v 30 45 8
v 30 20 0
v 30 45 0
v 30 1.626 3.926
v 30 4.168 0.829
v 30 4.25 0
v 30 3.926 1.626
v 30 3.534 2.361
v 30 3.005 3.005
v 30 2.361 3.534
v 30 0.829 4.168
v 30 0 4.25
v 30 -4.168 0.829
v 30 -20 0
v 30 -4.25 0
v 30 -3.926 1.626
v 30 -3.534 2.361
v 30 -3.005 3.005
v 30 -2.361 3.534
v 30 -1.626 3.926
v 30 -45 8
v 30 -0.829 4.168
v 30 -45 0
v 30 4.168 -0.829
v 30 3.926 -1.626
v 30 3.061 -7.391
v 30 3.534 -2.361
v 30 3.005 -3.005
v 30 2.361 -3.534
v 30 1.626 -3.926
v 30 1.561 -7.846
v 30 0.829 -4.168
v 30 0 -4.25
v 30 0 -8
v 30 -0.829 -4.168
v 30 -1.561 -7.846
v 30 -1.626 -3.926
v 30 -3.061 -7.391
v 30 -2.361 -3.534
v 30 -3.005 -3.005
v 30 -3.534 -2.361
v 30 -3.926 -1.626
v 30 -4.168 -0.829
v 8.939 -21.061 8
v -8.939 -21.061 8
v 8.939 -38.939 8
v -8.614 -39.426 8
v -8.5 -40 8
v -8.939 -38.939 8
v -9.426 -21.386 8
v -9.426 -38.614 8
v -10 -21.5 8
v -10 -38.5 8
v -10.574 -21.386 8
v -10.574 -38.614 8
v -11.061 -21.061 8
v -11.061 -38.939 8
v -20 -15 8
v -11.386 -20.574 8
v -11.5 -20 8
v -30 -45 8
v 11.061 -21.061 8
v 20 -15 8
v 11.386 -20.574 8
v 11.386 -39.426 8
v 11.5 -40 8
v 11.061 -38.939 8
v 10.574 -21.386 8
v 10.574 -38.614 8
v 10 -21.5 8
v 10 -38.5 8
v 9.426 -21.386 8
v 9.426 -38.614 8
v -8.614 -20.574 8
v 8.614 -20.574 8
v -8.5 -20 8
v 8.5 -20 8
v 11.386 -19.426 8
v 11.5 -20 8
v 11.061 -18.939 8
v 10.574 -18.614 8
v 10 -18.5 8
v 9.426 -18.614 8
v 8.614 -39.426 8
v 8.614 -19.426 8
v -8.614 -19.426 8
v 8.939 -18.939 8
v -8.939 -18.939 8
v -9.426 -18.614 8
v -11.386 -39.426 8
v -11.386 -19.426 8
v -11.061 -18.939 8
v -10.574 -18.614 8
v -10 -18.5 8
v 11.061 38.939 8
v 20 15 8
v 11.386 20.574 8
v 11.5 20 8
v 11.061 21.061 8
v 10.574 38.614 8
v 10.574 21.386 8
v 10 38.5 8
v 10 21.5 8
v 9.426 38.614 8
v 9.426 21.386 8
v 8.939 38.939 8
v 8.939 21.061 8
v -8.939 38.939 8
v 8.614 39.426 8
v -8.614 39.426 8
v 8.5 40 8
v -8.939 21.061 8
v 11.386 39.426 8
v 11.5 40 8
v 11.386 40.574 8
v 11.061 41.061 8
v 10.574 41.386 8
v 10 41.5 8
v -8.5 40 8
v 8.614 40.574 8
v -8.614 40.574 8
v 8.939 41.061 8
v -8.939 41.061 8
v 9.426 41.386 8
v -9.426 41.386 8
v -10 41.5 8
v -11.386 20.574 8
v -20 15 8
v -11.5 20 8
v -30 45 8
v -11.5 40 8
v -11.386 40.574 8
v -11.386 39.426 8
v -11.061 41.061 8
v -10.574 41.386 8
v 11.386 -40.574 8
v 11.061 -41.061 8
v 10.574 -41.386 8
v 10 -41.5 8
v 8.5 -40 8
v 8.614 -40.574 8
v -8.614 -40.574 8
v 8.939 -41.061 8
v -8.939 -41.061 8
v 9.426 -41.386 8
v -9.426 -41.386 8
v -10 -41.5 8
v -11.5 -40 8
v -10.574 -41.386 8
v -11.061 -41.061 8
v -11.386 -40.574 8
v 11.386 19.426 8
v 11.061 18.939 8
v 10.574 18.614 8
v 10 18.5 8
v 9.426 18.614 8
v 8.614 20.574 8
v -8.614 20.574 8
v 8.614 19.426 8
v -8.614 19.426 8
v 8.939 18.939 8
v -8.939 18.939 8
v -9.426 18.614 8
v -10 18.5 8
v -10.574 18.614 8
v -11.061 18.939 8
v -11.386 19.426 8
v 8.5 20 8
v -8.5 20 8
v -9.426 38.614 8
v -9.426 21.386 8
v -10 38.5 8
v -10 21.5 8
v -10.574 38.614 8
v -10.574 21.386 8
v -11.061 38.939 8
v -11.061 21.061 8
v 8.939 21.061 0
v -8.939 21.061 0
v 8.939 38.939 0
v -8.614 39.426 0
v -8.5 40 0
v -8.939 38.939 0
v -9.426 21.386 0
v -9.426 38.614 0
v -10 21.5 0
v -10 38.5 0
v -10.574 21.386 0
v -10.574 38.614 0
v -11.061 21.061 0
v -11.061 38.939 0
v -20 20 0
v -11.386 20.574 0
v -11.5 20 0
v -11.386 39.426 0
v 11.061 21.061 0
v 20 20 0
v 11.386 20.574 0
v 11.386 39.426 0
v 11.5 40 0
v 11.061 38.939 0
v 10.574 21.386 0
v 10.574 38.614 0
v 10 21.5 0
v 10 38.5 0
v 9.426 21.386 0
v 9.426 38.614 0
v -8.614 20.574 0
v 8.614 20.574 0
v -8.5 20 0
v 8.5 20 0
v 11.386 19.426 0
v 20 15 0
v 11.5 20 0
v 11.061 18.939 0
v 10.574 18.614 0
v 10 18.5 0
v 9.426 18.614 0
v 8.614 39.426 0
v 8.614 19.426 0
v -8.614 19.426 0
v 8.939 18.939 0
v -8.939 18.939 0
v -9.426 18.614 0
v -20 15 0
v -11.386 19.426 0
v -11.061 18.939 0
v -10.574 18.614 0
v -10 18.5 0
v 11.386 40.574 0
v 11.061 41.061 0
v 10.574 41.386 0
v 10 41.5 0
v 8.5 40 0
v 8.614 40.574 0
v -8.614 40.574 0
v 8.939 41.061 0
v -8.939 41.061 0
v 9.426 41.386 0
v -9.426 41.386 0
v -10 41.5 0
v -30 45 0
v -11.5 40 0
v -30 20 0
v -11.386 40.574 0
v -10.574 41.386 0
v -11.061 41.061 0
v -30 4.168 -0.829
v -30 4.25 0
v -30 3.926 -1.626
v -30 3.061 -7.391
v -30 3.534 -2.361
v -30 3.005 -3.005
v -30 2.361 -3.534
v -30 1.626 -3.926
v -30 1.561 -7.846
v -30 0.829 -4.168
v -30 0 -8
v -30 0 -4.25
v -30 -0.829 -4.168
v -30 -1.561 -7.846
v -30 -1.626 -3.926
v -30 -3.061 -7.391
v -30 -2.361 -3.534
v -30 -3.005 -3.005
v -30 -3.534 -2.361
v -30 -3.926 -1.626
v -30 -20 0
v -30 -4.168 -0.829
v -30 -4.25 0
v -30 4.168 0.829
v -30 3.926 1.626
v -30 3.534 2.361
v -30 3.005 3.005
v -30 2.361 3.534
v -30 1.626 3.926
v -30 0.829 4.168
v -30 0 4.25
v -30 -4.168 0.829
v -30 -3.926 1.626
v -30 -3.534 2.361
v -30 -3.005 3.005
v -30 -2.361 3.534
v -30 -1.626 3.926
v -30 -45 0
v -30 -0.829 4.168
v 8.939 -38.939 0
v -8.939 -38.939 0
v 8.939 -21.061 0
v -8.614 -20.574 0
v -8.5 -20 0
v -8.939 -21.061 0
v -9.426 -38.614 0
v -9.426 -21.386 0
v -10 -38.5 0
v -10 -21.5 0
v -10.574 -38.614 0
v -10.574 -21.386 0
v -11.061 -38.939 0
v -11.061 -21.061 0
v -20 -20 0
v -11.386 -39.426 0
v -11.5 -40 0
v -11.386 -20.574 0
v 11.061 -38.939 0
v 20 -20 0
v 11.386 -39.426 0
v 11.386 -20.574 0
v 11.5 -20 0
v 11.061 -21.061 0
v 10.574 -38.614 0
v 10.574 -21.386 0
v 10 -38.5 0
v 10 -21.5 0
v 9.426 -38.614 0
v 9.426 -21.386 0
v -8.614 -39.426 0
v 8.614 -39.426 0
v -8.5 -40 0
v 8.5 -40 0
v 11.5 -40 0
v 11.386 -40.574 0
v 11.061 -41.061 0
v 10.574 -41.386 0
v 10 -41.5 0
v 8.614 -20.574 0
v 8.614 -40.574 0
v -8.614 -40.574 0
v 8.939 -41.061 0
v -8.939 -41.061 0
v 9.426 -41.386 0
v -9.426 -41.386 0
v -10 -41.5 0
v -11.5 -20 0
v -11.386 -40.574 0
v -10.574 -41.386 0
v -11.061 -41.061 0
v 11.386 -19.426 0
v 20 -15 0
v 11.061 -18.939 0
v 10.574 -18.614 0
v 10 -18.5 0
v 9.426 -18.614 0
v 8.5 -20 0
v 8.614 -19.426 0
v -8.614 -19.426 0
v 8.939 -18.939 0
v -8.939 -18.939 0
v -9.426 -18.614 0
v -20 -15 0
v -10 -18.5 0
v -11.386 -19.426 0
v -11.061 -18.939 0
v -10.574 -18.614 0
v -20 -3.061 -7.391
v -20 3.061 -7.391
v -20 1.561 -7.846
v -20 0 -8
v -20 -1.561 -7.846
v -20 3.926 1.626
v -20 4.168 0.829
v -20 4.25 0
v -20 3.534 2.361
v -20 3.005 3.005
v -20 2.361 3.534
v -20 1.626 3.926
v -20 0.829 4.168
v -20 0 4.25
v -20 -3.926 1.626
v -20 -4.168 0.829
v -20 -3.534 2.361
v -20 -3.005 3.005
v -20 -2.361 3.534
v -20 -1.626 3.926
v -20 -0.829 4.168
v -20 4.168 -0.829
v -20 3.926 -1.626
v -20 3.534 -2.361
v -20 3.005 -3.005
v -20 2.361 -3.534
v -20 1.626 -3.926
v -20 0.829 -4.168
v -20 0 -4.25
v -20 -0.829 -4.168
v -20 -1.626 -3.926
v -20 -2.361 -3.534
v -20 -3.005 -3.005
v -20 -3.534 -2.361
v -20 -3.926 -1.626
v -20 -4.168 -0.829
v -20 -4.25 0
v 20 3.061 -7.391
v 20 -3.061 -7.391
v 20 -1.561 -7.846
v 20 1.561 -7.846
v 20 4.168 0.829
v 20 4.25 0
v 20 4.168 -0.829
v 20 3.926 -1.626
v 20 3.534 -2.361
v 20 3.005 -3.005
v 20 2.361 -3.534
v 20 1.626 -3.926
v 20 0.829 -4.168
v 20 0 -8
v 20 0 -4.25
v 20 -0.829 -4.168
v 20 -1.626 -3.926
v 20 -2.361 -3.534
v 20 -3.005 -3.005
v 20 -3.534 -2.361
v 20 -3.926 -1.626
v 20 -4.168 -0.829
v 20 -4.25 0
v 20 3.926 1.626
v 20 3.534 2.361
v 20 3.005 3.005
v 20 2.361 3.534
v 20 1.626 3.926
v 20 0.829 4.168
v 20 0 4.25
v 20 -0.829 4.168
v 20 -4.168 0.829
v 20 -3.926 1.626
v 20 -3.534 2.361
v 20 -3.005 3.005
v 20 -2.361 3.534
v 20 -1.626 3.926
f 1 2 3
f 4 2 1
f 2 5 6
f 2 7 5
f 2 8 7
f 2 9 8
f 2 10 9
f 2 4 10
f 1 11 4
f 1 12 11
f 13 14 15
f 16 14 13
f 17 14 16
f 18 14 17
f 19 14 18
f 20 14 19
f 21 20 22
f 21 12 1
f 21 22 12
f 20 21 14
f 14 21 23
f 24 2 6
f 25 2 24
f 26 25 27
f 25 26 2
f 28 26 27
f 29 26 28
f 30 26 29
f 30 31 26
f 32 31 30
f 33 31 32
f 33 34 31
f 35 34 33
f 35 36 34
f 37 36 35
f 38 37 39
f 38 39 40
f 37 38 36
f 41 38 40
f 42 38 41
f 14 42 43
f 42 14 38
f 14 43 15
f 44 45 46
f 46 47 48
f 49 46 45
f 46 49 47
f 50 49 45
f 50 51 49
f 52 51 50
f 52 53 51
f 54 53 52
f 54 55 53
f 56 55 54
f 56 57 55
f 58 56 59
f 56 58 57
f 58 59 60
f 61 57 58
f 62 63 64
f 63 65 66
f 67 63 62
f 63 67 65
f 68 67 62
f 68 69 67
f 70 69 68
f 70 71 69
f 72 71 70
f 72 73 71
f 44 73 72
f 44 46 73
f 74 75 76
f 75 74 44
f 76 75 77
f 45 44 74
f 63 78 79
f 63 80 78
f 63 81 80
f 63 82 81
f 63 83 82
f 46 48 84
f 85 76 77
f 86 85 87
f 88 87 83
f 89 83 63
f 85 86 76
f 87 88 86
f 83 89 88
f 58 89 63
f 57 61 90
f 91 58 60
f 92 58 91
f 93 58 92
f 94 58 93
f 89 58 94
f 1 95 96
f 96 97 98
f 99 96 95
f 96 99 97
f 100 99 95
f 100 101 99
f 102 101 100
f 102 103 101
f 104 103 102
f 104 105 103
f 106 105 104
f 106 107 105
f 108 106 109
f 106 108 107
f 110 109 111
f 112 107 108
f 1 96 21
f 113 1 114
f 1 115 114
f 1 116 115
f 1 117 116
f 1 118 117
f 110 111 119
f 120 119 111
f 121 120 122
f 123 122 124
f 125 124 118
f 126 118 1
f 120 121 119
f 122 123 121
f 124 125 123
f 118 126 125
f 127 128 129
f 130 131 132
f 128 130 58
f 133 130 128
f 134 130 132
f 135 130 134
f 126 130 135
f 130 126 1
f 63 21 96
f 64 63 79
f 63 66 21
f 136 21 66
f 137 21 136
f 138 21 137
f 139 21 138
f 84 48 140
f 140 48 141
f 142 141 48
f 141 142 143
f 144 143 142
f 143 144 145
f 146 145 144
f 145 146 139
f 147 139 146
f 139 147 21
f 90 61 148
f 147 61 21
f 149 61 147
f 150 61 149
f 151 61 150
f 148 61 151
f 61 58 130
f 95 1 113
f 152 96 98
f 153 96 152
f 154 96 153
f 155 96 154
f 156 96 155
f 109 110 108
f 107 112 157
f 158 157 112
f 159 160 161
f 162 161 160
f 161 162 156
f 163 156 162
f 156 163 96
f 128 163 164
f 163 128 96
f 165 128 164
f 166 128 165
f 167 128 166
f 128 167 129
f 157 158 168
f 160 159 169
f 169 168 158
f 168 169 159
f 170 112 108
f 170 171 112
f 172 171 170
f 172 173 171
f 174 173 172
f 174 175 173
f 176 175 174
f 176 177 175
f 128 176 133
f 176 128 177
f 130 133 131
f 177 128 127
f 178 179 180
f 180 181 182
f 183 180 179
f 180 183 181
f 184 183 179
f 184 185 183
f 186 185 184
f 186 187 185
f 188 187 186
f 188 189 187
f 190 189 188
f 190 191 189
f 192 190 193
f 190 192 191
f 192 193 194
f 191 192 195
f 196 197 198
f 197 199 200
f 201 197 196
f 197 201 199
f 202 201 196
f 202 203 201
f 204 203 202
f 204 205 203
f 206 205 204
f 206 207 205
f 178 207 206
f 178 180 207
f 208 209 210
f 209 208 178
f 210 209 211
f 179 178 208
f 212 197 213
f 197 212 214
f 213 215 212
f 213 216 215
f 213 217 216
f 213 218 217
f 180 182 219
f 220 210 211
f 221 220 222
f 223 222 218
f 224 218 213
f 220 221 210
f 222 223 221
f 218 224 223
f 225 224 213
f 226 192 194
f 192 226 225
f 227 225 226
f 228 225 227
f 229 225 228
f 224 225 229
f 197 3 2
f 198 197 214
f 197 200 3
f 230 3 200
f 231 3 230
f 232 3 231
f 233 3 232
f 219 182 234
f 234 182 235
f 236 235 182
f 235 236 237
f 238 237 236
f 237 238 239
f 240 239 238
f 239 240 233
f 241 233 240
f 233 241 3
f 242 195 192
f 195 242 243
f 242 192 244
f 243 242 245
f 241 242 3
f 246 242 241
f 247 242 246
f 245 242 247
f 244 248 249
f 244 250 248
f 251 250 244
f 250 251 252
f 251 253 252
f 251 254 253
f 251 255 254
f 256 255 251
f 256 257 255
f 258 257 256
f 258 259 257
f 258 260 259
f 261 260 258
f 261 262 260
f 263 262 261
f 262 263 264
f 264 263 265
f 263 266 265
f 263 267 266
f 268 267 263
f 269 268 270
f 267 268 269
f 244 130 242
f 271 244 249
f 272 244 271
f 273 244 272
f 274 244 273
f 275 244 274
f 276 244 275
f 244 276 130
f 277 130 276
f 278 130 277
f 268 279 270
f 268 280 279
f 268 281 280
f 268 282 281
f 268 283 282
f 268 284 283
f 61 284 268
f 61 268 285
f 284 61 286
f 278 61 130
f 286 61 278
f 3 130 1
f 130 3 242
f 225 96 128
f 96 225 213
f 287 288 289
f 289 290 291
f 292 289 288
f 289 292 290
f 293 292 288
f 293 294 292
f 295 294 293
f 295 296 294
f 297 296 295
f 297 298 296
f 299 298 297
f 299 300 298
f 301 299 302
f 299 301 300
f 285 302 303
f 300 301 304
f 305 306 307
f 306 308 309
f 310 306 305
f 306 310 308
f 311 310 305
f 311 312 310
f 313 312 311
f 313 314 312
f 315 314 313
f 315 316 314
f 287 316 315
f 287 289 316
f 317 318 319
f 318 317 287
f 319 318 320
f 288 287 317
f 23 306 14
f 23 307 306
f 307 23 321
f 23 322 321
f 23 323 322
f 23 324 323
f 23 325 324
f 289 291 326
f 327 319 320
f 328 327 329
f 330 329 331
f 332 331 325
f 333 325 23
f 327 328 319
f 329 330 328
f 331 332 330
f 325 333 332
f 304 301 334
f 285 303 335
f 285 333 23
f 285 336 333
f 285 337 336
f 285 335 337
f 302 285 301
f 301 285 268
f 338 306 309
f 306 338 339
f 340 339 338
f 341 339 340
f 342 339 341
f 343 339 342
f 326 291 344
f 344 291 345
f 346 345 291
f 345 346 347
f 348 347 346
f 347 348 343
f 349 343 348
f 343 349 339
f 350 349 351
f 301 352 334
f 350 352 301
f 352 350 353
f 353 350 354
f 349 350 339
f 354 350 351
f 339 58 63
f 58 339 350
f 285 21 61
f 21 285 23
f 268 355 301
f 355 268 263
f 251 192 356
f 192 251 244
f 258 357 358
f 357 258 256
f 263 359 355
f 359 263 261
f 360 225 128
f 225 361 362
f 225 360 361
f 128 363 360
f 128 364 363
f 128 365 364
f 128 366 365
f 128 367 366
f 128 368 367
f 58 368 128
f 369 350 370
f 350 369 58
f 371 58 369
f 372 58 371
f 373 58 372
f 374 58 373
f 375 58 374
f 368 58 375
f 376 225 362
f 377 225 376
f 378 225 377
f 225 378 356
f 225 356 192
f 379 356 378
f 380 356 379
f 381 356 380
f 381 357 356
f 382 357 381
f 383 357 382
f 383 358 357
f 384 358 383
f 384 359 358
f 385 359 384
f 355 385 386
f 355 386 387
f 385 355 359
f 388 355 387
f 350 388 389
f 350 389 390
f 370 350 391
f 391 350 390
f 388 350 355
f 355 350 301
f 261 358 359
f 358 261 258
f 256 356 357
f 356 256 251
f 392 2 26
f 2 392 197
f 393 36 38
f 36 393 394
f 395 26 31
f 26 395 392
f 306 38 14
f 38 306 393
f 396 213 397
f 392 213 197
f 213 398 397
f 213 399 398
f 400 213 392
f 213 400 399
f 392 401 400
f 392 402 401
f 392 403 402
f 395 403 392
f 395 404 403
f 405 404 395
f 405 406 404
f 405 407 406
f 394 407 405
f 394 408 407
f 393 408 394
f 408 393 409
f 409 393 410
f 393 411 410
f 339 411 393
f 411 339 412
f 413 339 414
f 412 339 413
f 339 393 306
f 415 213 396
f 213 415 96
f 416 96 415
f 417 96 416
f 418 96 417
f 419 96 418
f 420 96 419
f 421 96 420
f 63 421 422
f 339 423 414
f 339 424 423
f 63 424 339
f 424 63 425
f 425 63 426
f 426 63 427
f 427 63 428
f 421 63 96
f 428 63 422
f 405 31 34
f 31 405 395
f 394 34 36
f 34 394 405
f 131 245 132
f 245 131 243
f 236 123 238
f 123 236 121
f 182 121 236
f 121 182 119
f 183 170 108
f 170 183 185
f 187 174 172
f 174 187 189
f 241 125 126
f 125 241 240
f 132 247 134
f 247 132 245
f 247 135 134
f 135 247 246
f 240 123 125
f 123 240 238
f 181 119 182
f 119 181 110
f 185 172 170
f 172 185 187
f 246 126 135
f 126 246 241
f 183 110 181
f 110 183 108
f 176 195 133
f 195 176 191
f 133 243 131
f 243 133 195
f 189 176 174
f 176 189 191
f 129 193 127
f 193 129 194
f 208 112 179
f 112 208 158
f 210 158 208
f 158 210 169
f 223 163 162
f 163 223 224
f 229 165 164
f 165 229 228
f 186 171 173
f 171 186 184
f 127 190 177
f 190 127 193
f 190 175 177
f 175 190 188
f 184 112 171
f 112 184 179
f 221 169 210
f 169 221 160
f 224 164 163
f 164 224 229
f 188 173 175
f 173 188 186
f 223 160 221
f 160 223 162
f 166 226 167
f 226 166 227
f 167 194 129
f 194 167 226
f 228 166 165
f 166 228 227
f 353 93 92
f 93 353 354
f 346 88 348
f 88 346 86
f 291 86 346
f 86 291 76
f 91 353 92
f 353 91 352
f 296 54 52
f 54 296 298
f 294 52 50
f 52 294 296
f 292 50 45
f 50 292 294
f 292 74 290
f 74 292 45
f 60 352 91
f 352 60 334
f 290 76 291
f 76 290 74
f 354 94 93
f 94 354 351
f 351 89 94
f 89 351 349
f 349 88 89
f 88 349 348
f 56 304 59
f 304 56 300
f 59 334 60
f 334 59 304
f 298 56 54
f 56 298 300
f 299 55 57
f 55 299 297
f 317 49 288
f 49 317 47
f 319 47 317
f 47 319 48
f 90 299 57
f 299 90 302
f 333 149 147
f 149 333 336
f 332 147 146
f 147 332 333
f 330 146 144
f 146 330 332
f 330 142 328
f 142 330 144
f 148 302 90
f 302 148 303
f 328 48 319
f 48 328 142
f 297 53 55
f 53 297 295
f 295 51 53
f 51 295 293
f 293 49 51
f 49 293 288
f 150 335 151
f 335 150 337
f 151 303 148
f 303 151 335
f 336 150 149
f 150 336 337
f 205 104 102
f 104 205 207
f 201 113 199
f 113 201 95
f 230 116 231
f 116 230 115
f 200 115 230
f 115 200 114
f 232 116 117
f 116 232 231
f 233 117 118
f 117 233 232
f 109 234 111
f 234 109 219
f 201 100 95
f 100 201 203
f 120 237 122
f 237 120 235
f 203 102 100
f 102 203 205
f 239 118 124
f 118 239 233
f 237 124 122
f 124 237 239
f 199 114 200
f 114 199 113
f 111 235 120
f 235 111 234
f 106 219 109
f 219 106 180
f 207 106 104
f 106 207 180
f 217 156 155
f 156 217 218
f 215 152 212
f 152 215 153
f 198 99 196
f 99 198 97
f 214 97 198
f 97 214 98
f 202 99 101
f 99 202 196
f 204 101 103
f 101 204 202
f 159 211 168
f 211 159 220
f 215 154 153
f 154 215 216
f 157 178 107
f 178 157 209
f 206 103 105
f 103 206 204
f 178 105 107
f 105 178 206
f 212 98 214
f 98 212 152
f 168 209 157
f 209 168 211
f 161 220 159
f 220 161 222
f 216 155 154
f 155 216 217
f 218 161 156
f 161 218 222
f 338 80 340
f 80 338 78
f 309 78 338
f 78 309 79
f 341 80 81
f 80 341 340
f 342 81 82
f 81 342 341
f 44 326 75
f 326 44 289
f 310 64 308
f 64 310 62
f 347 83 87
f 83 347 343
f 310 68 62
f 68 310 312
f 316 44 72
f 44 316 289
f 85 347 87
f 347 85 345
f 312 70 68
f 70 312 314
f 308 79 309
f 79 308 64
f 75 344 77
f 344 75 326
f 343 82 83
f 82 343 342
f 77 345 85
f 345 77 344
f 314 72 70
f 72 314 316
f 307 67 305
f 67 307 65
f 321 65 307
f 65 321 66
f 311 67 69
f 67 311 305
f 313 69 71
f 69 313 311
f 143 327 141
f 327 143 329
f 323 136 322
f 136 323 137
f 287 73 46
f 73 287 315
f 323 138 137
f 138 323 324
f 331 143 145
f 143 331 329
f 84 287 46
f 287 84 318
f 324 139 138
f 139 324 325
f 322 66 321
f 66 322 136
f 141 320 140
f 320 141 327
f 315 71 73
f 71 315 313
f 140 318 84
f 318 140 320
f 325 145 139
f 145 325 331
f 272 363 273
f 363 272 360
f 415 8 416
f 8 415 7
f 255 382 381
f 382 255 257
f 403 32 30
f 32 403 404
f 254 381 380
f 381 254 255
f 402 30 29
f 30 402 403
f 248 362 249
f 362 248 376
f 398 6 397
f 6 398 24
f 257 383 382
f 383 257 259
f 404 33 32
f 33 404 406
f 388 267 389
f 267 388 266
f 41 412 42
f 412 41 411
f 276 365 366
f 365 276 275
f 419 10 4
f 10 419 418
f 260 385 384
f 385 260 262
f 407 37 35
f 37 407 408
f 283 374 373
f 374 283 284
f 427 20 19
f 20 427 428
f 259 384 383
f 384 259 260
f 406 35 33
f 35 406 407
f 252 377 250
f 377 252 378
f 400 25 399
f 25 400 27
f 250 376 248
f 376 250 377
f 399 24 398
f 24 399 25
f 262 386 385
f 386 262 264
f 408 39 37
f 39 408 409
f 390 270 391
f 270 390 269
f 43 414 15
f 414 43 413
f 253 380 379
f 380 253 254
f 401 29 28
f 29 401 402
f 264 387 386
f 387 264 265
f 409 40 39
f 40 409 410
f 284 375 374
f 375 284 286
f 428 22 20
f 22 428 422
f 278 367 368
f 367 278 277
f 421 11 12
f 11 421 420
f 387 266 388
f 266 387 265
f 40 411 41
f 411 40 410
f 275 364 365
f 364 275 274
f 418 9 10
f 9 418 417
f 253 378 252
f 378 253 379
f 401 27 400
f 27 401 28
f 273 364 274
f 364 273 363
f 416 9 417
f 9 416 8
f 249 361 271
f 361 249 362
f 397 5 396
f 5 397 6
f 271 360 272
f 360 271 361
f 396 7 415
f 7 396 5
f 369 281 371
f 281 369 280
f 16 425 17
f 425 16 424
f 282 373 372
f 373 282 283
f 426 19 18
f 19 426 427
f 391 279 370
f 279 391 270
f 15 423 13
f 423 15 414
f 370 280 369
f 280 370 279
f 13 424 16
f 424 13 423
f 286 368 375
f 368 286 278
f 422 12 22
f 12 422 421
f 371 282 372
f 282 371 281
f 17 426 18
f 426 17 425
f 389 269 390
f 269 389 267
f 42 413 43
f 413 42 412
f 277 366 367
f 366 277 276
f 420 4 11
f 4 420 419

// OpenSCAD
module x_axis_lead_screw_mount(){
    
    difference(){
        hull(){
            translate([0,0,30 -18])
            rotate([0,90,0])
            cylinder(d= 20, h=100, center = true);
            
            translate([-50,-20,0])
            cube([100,40,5]);
        }
        
        translate([0,0,30 -18])
        rotate([0,90,0])
        cylinder(d= 10, h=110, center = true);
        
        // mounts
        for( dx = [-45: 30: 60] ){
           for( dy = [-15, 15]){
               translate([dx, dy, 0])
               cylinder(d=3, h= 30, center = true, $fn=16);
               
               translate([dx, dy, 4])
               cylinder(d=8, h= 30, center = false, $fn=16);
           } 
        }
        
        translate([-51,-25,4])
        cube([31,50,50]);
        
        translate([20,-25,4])
        cube([31,50,50]);
    }
    
}

module x_axis_bearing_mount(){
    
    difference(){
        translate([0,-60,0])
        cube([60,100,6]);
        
        translate([30,-30,0])
        cylinder(d = 30, h = 30, $fn=16, center = true);
        
        translate([-5,0,3])
        cube([70,60,20]);
        
        // M3 mounts
        for(dx = [10, 30, 50]){
           translate([dx,20,0])
           cylinder(d=3, h= 50, center = true, $fn= 16);
        }
    }
}

module y_axis_lead_screw_mount(){
    
    difference(){
        union(){
            translate([-30,5,0])
            cube([60, 30, 8]);
            
            translate([-30,-35,0])
            cube([60, 30, 8]);
            
            hull(){
                translate([-25,0,0])
                rotate([0,90,0])
                cylinder(d=16, h= 10, center=true, $fn=32);
                
                translate([-30,5,0])
                cube([10, 15, 8]);
            
                translate([-30,-20,0])
                cube([10, 15, 8]);
            }
            
            hull(){
                translate([25,0,0])
                rotate([0,90,0])
                cylinder(d=16, h= 10, center=true, $fn=32);
                
                translate([20,5,0])
                cube([10, 15, 8]);
            
                translate([20,-20,0])
                cube([10, 15, 8]);
            }
        }
        
        // M3 mount
        for (dx = [-10, 10]){
            for ( dy = [30,10, -10, -30]){
                translate([dx, dy, 0])
                cylinder(d= 3, h = 50, center =true, $fn=16);
            }
        }
        
        // screw hole
        rotate([0,90,0])
        cylinder(d=8.5, h= 200, center=true, $fn=32);
    }

}


module z_axis_lead_screw_mount(){
    
    difference(){
        union(){
            translate([-30,15,0])
            cube([60, 30, 8]);
            
            translate([-30,-45,0])
            cube([60, 30, 8]);
            
            hull(){
                translate([-25,0,0])
                rotate([0,90,0])
                cylinder(d=16, h= 10, center=true, $fn=32);
                
                translate([-30,5,0])
                cube([10, 15, 8]);
            
                translate([-30,-20,0])
                cube([10, 15, 8]);
            }
            
            hull(){
                translate([25,0,0])
                rotate([0,90,0])
                cylinder(d=16, h= 10, center=true, $fn=32);
                
                translate([20,5,0])
                cube([10, 15, 8]);
            
                translate([20,-20,0])
                cube([10, 15, 8]);
            }
        }
        
        // M3 mount
        for (dx = [-10, 10]){
            for ( dy = [40,20, -20, -40]){
                translate([dx, dy, 0])
                cylinder(d= 3, h = 50, center =true, $fn=16);
            }
        }
        
        // screw hole
        rotate([0,90,0])
        cylinder(d=8.5, h= 200, center=true, $fn=32);
    }

}


//x_axis_lead_screw_mount();
//x_axis_bearing_mount();
//y_axis_lead_screw_mount();
z_axis_lead_screw_mount();
